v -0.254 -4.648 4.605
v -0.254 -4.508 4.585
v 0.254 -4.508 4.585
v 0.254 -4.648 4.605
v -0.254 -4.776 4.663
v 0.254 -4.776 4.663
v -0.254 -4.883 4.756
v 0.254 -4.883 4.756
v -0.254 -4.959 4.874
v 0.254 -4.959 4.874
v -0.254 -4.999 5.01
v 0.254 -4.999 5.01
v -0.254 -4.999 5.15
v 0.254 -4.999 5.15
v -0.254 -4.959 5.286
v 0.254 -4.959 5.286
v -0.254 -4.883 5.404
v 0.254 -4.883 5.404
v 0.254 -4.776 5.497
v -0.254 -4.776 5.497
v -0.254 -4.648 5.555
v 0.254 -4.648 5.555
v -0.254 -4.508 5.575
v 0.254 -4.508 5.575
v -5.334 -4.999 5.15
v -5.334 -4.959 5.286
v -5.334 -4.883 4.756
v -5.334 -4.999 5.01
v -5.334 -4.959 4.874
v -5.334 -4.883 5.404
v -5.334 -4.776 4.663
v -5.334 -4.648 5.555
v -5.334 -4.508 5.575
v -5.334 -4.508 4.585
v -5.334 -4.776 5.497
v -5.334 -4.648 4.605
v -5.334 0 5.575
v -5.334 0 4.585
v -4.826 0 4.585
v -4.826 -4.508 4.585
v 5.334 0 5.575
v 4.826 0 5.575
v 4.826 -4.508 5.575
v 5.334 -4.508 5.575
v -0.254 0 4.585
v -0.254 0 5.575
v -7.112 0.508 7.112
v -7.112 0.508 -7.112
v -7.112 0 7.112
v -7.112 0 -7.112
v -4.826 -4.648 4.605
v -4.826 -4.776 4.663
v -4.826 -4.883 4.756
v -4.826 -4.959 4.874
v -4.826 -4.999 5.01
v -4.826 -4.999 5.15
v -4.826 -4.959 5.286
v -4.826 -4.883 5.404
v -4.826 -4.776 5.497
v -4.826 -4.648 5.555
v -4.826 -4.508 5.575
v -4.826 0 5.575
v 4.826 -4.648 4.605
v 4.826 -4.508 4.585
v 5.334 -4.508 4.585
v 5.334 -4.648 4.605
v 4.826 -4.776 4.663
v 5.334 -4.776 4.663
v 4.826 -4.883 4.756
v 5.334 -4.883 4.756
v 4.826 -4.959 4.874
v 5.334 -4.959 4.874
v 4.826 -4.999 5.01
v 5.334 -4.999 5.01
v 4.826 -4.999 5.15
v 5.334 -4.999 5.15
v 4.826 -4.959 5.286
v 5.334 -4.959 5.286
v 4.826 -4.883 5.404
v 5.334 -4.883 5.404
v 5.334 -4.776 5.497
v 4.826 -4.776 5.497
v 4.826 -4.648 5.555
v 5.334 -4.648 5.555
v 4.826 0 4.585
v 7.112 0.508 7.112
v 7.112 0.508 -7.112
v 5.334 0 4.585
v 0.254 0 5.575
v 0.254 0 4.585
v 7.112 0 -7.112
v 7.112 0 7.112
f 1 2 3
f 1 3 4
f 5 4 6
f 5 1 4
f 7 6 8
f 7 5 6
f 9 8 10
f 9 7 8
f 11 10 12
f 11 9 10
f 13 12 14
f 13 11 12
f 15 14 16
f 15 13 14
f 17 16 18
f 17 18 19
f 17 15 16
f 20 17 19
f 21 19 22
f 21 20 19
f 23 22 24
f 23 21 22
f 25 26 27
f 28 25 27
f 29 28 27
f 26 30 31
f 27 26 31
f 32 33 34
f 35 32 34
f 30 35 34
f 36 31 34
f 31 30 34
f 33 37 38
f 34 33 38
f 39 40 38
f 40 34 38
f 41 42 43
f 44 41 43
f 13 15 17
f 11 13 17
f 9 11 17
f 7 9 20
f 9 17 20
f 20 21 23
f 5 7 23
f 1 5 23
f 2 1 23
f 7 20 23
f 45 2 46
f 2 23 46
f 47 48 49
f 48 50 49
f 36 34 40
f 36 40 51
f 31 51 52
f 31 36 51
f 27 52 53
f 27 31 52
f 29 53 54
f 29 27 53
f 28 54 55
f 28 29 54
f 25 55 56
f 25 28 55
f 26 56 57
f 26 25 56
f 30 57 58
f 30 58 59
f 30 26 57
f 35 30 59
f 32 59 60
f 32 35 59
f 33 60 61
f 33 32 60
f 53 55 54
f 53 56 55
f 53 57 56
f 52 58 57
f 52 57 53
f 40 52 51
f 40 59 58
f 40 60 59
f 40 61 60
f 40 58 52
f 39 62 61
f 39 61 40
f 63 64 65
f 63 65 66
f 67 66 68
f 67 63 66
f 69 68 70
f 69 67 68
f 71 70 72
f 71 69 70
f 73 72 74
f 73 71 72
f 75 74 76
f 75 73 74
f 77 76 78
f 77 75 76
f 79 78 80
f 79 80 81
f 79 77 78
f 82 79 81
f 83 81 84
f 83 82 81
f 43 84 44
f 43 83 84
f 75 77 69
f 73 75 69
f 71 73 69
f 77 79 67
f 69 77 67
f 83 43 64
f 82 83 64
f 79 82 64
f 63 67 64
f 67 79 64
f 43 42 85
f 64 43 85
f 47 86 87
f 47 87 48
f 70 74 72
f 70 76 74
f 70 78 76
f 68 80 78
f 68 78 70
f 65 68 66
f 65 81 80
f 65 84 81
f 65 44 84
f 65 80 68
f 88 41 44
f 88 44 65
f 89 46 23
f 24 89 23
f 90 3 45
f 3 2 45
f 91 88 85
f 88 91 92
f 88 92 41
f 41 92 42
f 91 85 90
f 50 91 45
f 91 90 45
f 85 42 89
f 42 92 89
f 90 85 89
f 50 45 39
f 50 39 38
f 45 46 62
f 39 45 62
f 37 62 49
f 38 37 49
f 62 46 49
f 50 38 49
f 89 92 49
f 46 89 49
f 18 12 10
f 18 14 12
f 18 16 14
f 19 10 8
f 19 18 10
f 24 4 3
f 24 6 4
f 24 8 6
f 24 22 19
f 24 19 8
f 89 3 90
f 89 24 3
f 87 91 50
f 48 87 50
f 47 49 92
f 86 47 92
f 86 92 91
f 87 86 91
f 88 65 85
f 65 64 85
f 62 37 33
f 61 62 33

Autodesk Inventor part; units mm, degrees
sketch "Sketch_1" plane through (0, 0, 0) normal (0, 1, 0) x (-1, 0, 0)
  line L0 (7.112, -7.112) -> (7.112, 7.112)
  line L1 (7.112, 7.112) -> (-7.112, 7.112)
  line L2 (-7.112, 7.112) -> (-7.112, -7.112)
  line L3 (-7.112, -7.112) -> (7.112, -7.112)
extrude "Extrusion1" add sketch "Sketch_1" along normal blind 0.508
sketch "Sketch_10" plane through (-5.08, 0, 0) normal (1, 0, 0) x (0, 0, -1)
  arc A0 (-5.5753, -4.5085) -> (-5.08, -5.0038) centre (-5.08, -4.5085) ccw
  arc A1 (-5.08, -5.0038) -> (-4.5847, -4.5085) centre (-5.08, -4.5085) ccw
  line L0 (-4.5847, -4.5085) -> (-4.5847, 0.508)
  line L1 (-4.5847, 0.508) -> (-5.5753, 0.508)
  line L2 (-5.5753, 0.508) -> (-5.5753, -4.5085)
extrude "Extrusion2" add sketch "Sketch_10" along normal mid plane 0.508
sketch "Sketch_12" plane through (0, 0, 0) normal (1, 0, 0) x (0, 1, 0)
  arc A0 (-4.5085, 5.5753) -> (-5.0038, 5.08) centre (-4.5085, 5.08) ccw
  arc A1 (-5.0038, 5.08) -> (-4.5085, 4.5847) centre (-4.5085, 5.08) ccw
  line L0 (-4.5085, 4.5847) -> (0.508, 4.5847)
  line L1 (0.508, 4.5847) -> (0.508, 5.5753)
  line L2 (0.508, 5.5753) -> (-4.5085, 5.5753)
extrude "Extrusion3" add sketch "Sketch_12" along normal mid plane 0.508
sketch "Sketch_14" plane through (5.08, 0, 0) normal (1, 0, 0) x (0, 0, -1)
  arc A0 (-5.5753, -4.5085) -> (-5.08, -5.0038) centre (-5.08, -4.5085) ccw
  arc A1 (-5.08, -5.0038) -> (-4.5847, -4.5085) centre (-5.08, -4.5085) ccw
  line L0 (-4.5847, -4.5085) -> (-4.5847, 0.508)
  line L1 (-4.5847, 0.508) -> (-5.5753, 0.508)
  line L2 (-5.5753, 0.508) -> (-5.5753, -4.5085)
extrude "Extrusion4" add sketch "Sketch_14" along normal mid plane 0.508
ref_plane "pole_to_body_XY" through (0, 0.508, 0) normal (0, 1, 0) x (1, 0, 0)
ref_plane "pole_to_body_YZ" through (0, 0.508, 0) normal (1, 0, 0) x (0, 0, -1)
ref_plane "pole_to_body_ZX" through (0, 0.508, 0) normal (0, 0, -1) x (0, 1, 0)
properties part number "UB216SKG035D-NR"
